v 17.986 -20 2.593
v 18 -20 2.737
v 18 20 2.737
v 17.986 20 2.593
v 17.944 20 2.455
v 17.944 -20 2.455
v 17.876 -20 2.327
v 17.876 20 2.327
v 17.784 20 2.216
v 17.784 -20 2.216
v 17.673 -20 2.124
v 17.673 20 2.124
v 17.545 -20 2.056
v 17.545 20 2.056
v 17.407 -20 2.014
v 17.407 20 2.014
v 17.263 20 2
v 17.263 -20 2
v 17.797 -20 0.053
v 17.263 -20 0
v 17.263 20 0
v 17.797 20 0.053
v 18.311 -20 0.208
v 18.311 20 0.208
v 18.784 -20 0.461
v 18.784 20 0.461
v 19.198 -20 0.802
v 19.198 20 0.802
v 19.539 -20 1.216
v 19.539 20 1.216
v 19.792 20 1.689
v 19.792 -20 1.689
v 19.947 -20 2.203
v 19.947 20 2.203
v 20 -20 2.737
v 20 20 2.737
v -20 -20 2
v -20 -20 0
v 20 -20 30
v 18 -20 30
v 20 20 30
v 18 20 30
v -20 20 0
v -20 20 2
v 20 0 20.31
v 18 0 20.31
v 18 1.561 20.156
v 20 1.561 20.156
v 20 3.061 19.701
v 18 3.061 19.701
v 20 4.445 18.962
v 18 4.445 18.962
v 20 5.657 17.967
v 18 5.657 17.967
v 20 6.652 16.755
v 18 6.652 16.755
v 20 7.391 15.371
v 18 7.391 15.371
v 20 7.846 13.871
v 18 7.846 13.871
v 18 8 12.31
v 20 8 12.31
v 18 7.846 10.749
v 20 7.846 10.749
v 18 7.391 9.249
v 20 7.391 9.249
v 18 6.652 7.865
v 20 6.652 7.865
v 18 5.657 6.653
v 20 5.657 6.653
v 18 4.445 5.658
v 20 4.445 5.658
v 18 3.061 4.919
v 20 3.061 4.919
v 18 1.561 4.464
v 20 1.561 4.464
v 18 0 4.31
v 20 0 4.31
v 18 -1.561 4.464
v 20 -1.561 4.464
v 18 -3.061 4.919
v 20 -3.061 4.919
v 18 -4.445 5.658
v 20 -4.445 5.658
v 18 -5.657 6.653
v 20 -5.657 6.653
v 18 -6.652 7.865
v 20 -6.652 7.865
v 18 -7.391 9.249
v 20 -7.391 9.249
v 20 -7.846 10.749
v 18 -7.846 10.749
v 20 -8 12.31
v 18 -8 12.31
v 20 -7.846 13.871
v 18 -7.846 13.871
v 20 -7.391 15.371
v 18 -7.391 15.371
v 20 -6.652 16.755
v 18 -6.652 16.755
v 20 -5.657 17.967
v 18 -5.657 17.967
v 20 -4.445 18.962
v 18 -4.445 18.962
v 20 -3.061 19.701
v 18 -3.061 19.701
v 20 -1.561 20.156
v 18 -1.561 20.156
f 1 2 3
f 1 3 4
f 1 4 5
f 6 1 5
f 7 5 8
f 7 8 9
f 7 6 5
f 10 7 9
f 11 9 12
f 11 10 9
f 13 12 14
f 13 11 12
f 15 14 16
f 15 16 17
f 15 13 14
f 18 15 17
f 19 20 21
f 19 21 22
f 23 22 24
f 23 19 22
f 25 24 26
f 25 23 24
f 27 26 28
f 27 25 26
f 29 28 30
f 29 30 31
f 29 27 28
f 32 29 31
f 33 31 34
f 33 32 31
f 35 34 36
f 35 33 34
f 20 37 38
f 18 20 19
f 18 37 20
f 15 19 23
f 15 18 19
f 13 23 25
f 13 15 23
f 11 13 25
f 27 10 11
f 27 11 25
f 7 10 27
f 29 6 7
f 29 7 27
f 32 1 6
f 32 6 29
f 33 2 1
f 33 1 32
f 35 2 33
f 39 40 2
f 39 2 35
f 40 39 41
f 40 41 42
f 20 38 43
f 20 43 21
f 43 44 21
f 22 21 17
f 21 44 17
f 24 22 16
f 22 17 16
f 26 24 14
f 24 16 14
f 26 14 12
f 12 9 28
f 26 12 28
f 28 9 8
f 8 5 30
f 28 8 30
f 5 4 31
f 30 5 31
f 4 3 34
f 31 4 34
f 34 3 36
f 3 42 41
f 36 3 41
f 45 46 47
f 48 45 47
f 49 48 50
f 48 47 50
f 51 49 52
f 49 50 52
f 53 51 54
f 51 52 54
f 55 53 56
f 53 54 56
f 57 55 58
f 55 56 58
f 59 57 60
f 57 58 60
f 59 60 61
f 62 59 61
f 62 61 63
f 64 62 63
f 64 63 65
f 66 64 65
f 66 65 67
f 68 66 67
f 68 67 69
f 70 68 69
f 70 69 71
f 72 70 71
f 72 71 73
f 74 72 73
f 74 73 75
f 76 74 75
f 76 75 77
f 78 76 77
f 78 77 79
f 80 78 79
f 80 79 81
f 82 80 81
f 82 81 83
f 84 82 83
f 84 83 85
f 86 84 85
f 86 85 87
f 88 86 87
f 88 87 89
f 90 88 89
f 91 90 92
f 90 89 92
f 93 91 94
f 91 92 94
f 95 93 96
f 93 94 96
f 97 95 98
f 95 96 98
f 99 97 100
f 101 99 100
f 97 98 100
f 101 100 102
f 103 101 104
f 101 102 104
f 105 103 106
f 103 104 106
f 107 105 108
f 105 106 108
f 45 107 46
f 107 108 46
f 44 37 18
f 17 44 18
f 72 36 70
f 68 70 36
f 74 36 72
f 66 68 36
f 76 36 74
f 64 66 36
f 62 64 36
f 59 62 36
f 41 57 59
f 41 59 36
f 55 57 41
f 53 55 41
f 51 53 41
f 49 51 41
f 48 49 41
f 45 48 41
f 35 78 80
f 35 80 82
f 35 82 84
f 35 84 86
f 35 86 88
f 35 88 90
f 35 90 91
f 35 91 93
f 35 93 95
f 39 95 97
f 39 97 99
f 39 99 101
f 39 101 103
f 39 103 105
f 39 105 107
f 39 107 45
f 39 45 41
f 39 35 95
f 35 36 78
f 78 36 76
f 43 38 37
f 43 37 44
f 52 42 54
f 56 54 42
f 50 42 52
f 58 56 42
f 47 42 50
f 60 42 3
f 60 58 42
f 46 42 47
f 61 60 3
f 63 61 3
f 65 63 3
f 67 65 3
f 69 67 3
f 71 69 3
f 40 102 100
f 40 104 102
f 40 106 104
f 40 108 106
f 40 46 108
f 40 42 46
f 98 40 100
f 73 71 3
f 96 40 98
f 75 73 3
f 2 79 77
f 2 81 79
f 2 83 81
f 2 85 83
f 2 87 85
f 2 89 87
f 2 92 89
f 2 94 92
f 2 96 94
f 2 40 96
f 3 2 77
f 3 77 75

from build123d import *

# Parameters (mm, degrees)
CROQUIS1_W                       = 40
CROQUIS1_H                       = 40
BRIDA_BASE1_DEPTH                = 2
BRIDA_DE_ARISTA1_STRIP_W         = 9.4732
BRIDA_DE_ARISTA1_STRIP_H         = 2
BRIDA_DE_ARISTA1_STRIP_CUT_DEPTH = 40
BRIDA_DE_ARISTA1_DEPTH           = 40
CORTAR_EXTRUIR2_REACH            = 54.383
CROQUIS11_R                      = 8


# Sheet-metal steps are written as plain solids
with BuildPart() as part:
    # Croquis1 → Brida base1 (new body)
    with BuildSketch(Plane.XY):
        Rectangle(CROQUIS1_W, CROQUIS1_H)
    extrude(amount=BRIDA_BASE1_DEPTH)

    # Brida de arista1 strip (across the edge) → Brida de arista1 strip cut (cut)
    with BuildSketch(Plane(origin=(20, -20, 2), x_dir=(-1, 0, 0), z_dir=(0, 1, 0))):
        with Locations((-2, -1)):
            Rectangle(BRIDA_DE_ARISTA1_STRIP_W, BRIDA_DE_ARISTA1_STRIP_H)
    extrude(amount=BRIDA_DE_ARISTA1_STRIP_CUT_DEPTH, mode=Mode.SUBTRACT)

    # Brida de arista1 section (across the edge) → Brida de arista1 (add)
    with BuildSketch(Plane(origin=(20, -20, 2), x_dir=(-1, 0, 0), z_dir=(0, 1, 0))):
        with BuildLine():
            Line((0, 0.7366), (0, 28))
            Line((0, 28), (2, 28))
            Line((2, 28), (2, 0.7366))
            ThreePointArc((2, 0.7366), (2.215745145, 0.215745145), (2.7366, 0))
            Line((2.7366, 0), (2.7366, -2))
            ThreePointArc((2.7366, -2), (0.801531583, -1.198468417), (0, 0.7366))
        make_face()
    extrude(amount=BRIDA_DE_ARISTA1_DEPTH)

    # Croquis11 → Cortar-Extruir2 (cut, up to next)
    with BuildSketch(Plane.ZY.offset(-18), mode=Mode.PRIVATE) as cortar_extruir2_sk1:
        with Locations((12.31, 0)):
            Circle(CROQUIS11_R)
    cortar_extruir2_tool1 = extrude(cortar_extruir2_sk1.sketch, amount=-CORTAR_EXTRUIR2_REACH, mode=Mode.PRIVATE) & part.part
    add(cortar_extruir2_tool1.solids().sort_by_distance((18, 0, 12.31))[0], mode=Mode.SUBTRACT)


solid = part.part
